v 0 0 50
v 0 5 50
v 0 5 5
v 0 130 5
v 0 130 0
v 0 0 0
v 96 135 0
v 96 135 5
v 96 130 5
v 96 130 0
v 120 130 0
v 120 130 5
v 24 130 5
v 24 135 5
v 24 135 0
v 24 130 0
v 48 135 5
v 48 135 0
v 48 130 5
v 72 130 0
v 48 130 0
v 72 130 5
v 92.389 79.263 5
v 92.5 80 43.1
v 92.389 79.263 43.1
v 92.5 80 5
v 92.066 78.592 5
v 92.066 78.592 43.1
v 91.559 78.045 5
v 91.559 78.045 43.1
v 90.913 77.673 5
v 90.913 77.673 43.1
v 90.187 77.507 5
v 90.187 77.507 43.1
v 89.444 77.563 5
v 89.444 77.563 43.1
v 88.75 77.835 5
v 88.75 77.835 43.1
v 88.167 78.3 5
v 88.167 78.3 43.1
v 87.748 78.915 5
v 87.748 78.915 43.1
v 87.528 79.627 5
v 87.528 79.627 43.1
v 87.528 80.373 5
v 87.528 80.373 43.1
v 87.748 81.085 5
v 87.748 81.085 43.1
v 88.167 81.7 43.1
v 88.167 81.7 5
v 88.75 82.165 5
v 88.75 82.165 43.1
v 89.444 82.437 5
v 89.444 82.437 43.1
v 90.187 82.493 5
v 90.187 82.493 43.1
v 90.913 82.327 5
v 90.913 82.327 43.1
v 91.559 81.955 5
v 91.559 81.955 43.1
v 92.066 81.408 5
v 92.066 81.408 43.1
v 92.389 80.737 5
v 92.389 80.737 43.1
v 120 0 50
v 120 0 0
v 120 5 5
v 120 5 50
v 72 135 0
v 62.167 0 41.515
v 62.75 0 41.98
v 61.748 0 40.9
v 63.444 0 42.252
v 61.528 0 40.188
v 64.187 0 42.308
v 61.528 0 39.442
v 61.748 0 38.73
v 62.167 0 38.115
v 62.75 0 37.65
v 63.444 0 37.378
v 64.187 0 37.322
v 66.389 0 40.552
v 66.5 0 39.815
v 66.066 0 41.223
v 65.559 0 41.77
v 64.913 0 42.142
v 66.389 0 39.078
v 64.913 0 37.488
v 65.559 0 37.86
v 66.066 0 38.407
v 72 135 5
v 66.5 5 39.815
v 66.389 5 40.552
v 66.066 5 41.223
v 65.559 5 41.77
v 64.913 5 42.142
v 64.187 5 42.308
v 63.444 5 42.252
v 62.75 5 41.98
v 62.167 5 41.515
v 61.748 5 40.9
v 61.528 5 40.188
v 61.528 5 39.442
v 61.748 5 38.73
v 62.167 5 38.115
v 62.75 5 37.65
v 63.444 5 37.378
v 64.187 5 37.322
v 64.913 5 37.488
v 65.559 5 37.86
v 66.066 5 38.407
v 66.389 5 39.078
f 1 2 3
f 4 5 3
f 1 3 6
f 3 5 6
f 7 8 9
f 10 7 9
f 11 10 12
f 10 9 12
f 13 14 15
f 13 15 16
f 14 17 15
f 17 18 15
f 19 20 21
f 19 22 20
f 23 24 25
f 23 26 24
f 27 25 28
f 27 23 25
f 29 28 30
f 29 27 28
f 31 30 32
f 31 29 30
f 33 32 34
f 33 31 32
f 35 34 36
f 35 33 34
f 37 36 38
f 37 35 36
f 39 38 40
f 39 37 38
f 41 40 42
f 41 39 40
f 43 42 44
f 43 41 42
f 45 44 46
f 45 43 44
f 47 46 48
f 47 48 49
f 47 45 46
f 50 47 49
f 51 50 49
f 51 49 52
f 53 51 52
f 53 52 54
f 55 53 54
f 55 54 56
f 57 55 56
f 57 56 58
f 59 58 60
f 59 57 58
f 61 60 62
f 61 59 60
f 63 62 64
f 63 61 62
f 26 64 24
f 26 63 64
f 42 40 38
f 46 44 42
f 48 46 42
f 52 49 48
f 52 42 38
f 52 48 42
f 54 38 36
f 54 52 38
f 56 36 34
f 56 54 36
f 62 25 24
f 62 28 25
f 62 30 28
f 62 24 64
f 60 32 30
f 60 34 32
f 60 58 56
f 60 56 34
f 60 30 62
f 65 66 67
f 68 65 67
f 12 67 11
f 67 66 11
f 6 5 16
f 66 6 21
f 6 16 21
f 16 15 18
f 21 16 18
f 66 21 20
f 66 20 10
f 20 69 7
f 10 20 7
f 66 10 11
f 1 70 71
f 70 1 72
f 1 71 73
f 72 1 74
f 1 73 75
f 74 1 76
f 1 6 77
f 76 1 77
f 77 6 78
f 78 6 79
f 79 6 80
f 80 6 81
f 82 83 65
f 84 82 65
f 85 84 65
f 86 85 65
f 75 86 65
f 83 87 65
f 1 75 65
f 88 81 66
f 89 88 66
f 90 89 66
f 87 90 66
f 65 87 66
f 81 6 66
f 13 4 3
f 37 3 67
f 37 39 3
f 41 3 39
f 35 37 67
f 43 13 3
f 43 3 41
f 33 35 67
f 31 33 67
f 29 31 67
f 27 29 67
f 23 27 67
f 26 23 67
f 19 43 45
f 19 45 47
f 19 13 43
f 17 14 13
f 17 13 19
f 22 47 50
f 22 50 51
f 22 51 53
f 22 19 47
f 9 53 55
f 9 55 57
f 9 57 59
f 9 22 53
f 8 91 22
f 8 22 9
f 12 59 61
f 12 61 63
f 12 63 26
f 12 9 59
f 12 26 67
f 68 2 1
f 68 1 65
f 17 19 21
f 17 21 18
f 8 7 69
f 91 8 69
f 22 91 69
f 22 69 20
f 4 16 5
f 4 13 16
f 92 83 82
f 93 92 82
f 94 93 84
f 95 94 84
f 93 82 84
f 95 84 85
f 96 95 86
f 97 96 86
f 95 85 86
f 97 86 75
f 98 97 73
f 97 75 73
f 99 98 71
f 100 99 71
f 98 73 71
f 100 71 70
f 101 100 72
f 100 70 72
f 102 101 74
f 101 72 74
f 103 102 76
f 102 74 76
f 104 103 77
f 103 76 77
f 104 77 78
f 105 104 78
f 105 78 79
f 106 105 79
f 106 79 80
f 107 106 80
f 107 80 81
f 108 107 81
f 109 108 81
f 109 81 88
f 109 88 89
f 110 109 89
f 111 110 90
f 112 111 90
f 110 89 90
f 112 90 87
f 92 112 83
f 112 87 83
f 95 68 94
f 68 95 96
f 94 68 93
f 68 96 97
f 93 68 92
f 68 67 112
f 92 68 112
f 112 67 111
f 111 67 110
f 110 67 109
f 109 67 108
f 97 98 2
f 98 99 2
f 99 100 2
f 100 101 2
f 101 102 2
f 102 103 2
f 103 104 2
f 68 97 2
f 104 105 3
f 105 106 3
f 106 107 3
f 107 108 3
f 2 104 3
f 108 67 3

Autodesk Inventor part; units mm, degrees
ref_plane "YZ Plane" through (0, 0, 0) normal (1, 0, 0) x (0, 1, 0)
ref_plane "XZ Plane" through (0, 0, 0) normal (0, 1, 0) x (-1, 0, 0)
ref_plane "XY Plane" through (0, 0, 0) normal (0, 0, 1) x (1, 0, 0)
sketch "Sketch1" plane through (0, 0, 0) normal (0, 0, 1) x (1, 0, 0)
  line L0 (0, 0) -> (120, 0)
  line L1 (120, 0) -> (120, 135)
  line L2 (120, 135) -> (0, 135)
  line L3 (0, 135) -> (0, 0)
  dimension "d0" = 120
  dimension "d1" = 135
extrude "Extrusion1" add sketch "Sketch1" along normal blind 5
sketch "Sketch2" plane through (0, 0, 5) normal (0, 0, 1) x (1, 0, 0)
  line L0 (0, 0) -> (120, 0) projected
  line L1 (0, 0) -> (120, 0)
  line L2 (120, 0) -> (120, 5)
  line L3 (120, 5) -> (0, 5)
  line L4 (0, 5) -> (0, 0)
  dimension "d4" = 120
  dimension "d5" = 5
extrude "Extrusion2" add sketch "Sketch2" along normal blind 45
sketch "Sketch3" plane through (0, 0, 5) normal (0, 0, 1) x (1, 0, 0)
  line L0 (120, 135) -> (0, 135) projected
  line L1 (0, 135) -> (24, 135)
  line L2 (24, 135) -> (24, 130)
  line L3 (24, 130) -> (0, 130)
  line L4 (0, 130) -> (0, 135)
  line L5 (120, 135) -> (96, 135)
  line L6 (96, 135) -> (96, 130)
  line L7 (96, 130) -> (120, 130)
  line L8 (120, 130) -> (120, 135)
  line L9 (48, 135) -> (72, 135)
  line L10 (72, 135) -> (72, 130)
  line L11 (72, 130) -> (48, 130)
  line L12 (48, 130) -> (48, 135)
  point P0 (0, 0)
  dimension "d8" = 24
  dimension "d9" = 5
  dimension "d10" = 24
  dimension "d11" = 5
  dimension "d12" = 24
  dimension "d13" = 24
extrude "Extrusion3" cut sketch "Sketch3" against normal blind 45
sketch "Sketch4" plane through (0, 0, 5) normal (0, 0, 1) x (1, 0, 0)
  line L0 (1.8933, 18.6085) -> (59.744, 18.6085) construction
  line L1 (59.744, 18.6085) -> (59.744, 5.8096) construction
  line L2 (59.744, 5.8096) -> (1.8933, 5.8096) construction
  line L3 (1.8933, 5.8096) -> (1.8933, 18.6085) construction
  point P0 (0, 0)
sketch "Sketch5" plane through (0, 0, 0) normal (0, -1, 0) x (1, 0, 0)
  line L0 (1.2536, 49.5181) -> (91.5145, 49.5181) construction
  line L1 (91.5145, 49.5181) -> (91.5145, 35.1014) construction
  line L2 (91.5145, 35.1014) -> (1.2536, 35.1014) construction
  line L3 (1.2536, 35.1014) -> (1.2536, 49.5181) construction
  point P0 (0, 0)
sketch "Sketch6" plane through (0, 5, 5) normal (0, 1, 0) x (1, 0, 0)
  line L0 (39.1274, -43.5353) -> (-30.0492, -43.5353) construction
  line L1 (-30.0492, -43.5353) -> (-30.0492, -68.4744) construction
  line L2 (-30.0492, -68.4744) -> (39.1274, -68.4744) construction
  line L3 (39.1274, -68.4744) -> (39.1274, -43.5353) construction
  point P0 (0, 5)
sketch "Sketch7" plane through (0, 0, 0) normal (0, 0, -1) x (-1, 0, 0)
  line L0 (-119.0942, 8.7754) -> (-47.9511, 8.7754) construction
  line L1 (-47.9511, 8.7754) -> (-47.9511, -14.4167) construction
  line L2 (-47.9511, -14.4167) -> (-119.0942, -14.4167) construction
  line L3 (-119.0942, -14.4167) -> (-119.0942, 8.7754) construction
  point P0 (0, 0)
sketch "Sketch8" plane through (0, 0, 0) normal (0, -1, 0) x (1, 0, 0)
  point P0 (0, 0)
sketch "Sketch9" plane through (0, 0, 0) normal (0, -1, 0) x (1, 0, 0)
  line L0 (120, 0) -> (120, 5) projected
  line L1 (120, 0) -> (120, 39.815)
  line L2 (120, 39.815) -> (64, 39.815)
  circle A0 centre (64, 39.815) radius 2.5
  point P0 (0, 0)
  dimension "d18" = 39.815
  dimension "d19" = 56
  dimension "d20" = 5
extrude "Extrusion4" cut sketch "Sketch9" against normal blind 10
sketch "Sketch10" plane through (0, 0, 5) normal (0, 0, 1) x (1, 0, 0)
  point P0 (0, 0)
sketch "Sketch11" plane through (0, 0, 5) normal (0, 0, 1) x (1, 0, 0)
  line L0 (120, 5) -> (120, 130) projected
  line L1 (120, 5) -> (90, 5)
  line L2 (120, 5) -> (0, 5) projected
  line L3 (90, 5) -> (90, 80)
  circle A0 centre (90, 80) radius 2.5
  point P0 (0, 0)
  dimension "d23" = 30
  dimension "d24" = 75
  dimension "d25" = 5
extrude "Extrusion5" add sketch "Sketch11" along normal blind 38.1
properties part number "WormGearMount"
